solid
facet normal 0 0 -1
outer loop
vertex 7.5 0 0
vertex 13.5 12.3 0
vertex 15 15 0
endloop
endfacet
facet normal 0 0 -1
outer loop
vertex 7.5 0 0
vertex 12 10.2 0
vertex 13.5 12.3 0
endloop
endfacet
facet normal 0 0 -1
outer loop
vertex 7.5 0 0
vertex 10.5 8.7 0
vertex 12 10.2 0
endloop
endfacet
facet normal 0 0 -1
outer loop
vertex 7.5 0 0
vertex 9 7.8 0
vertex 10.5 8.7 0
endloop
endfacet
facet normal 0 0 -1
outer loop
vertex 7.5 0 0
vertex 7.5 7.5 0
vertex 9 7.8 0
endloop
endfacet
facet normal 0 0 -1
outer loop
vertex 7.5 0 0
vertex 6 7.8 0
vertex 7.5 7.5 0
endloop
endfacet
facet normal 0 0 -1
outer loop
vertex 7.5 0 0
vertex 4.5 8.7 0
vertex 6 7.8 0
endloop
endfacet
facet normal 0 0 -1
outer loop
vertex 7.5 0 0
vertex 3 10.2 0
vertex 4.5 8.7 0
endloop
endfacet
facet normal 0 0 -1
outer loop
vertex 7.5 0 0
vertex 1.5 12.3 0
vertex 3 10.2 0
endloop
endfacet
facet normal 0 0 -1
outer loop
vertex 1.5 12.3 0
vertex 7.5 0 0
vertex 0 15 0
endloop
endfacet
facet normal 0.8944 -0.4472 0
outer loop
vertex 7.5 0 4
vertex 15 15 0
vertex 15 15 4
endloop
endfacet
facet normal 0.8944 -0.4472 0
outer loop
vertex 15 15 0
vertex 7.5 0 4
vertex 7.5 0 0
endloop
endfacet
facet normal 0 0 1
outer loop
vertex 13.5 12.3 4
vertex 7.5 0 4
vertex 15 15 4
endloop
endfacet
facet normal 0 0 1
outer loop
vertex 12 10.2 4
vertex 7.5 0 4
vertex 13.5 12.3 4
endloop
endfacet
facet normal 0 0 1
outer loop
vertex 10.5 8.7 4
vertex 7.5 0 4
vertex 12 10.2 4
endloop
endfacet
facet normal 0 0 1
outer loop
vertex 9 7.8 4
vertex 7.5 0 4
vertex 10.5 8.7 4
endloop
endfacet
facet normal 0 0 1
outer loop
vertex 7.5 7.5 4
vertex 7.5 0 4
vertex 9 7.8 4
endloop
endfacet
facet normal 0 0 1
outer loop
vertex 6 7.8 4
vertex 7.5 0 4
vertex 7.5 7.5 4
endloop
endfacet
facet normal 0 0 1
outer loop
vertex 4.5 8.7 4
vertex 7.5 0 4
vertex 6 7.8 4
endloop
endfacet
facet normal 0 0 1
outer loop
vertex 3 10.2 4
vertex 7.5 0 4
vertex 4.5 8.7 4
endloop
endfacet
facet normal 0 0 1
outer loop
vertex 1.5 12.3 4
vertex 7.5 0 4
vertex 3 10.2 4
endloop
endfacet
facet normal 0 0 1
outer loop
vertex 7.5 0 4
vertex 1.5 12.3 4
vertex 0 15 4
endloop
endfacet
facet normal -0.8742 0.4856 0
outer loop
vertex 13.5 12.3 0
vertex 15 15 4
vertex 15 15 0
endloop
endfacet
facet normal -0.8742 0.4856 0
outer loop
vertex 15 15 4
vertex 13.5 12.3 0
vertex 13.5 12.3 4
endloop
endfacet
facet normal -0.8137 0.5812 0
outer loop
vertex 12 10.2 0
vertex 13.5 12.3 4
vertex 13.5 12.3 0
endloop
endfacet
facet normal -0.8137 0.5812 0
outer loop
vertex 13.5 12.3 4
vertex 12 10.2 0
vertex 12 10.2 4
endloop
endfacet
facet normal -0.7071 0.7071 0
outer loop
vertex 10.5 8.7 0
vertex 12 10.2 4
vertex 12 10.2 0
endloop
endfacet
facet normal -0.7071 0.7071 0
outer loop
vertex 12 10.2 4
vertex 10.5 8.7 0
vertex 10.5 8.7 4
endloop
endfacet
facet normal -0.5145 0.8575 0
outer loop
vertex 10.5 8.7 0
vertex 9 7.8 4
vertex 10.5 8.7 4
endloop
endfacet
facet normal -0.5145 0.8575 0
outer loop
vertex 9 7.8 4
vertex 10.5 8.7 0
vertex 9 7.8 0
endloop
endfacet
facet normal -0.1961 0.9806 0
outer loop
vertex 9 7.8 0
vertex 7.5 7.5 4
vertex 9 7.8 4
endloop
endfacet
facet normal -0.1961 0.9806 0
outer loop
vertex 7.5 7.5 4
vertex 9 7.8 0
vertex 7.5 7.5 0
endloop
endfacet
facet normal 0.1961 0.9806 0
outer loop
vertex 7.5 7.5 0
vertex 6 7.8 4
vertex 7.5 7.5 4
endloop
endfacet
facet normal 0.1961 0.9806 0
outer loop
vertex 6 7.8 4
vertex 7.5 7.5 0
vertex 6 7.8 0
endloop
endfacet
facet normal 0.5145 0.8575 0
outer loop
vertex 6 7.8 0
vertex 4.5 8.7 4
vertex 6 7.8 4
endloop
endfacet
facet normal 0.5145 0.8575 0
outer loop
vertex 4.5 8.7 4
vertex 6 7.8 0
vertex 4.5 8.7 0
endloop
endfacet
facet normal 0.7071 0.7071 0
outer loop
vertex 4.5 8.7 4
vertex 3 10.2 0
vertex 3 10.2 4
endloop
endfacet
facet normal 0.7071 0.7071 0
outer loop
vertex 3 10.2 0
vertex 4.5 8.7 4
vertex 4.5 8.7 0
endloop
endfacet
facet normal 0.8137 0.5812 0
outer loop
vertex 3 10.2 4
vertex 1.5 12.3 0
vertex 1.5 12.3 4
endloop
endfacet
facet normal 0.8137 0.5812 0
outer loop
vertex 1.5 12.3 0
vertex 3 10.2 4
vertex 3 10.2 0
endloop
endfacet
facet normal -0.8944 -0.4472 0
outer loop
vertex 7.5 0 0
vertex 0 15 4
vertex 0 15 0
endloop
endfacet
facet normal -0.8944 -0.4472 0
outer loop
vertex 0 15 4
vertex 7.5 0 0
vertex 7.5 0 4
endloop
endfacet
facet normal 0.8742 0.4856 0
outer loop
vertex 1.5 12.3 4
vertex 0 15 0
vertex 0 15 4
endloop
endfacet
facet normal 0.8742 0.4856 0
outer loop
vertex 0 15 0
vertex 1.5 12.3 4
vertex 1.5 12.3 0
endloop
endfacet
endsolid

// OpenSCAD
//Taken from https://www.thingiverse.com/thing:8443

joinfactor = 0.125;

gFocalPoint = [0,0];
gSteps = 10;
gHeight = 4;

BezQuadCurve( [[0, 15],[5,5],[10,5],[15,15]], [7.5,0], gSteps, gHeight);

//=======================================
// Functions
//=======================================
function BEZ03(u) = pow((1-u), 3);
function BEZ13(u) = 3*u*(pow((1-u),2));
function BEZ23(u) = 3*(pow(u,2))*(1-u);
function BEZ33(u) = pow(u,3);

function PointAlongBez4(p0, p1, p2, p3, u) = [
	BEZ03(u)*p0[0]+BEZ13(u)*p1[0]+BEZ23(u)*p2[0]+BEZ33(u)*p3[0],
	BEZ03(u)*p0[1]+BEZ13(u)*p1[1]+BEZ23(u)*p2[1]+BEZ33(u)*p3[1]];

//=======================================
// Modules
//=======================================
// c - ControlPoints
module BezQuadCurve(c, focalPoint, steps=gSteps, height=gHeight)
{
	// Draw control points
	// Just comment this out when you're doing the real thing
	// for(point=[0:3])
	// {
	// 	translate(c[point])
	// 	color([1,0,0])
	// 	cylinder(r=1, h=height+joinfactor);
	// }

	for(step = [steps:-1:1])
	{
		linear_extrude(height = height, convexity = 10) 
		polygon(
			points=[
				focalPoint,
				PointAlongBez4(c[0], c[1], c[2],c[3], step/steps),
				PointAlongBez4(c[0], c[1], c[2],c[3], (step-1)/steps)],
			paths=[[0,1,2,0]]
		);
	}
}

//==============================================
// Test functions
//==============================================
//PlotBEZ0(100);
//PlotBEZ1(100);
//PlotBEZ2(100);
//PlotBEZ3(100);
//PlotBez4Blending();


module PlotBEZ0(steps)
{
	cubeSize = 1;
	cubeHeight = steps;

	for (step=[0:steps])
	{
		translate([cubeSize*step, 0, 0])
		cube(size=[cubeSize, cubeSize, BEZ03(step/steps)*cubeHeight]);
	}	
}

module PlotBEZ1(steps)
{
	cubeSize = 1;
	cubeHeight = steps;

	for (step=[0:steps])
	{
		translate([cubeSize*step, 0, 0])
		cube(size=[cubeSize, cubeSize, BEZ13(step/steps)*cubeHeight]);
	}	
}

module PlotBEZ2(steps)
{
	cubeSize = 1;
	cubeHeight = steps;

	for (step=[0:steps])
	{
		translate([cubeSize*step, 0, 0])
		cube(size=[cubeSize, cubeSize, BEZ23(step/steps)*cubeHeight]);
	}	
}

module PlotBEZ3(steps)
{
	cubeSize = 1;
	cubeHeight = steps;

	for (step=[0:steps])
	{
		translate([cubeSize*step, 0, 0])
		cube(size=[cubeSize, cubeSize, BEZ33(step/steps)*cubeHeight]);
	}	
}

module PlotBez4Blending()
{
	sizing = 100;

	translate([0, 0, sizing + 10])
	PlotBEZ0(100);

	translate([sizing+10, 0, sizing + 10])
	PlotBEZ1(100);

	translate([0, 0, 0])
	PlotBEZ2(100);

	translate([sizing+10, 0, 0])
	PlotBEZ3(100);
}
